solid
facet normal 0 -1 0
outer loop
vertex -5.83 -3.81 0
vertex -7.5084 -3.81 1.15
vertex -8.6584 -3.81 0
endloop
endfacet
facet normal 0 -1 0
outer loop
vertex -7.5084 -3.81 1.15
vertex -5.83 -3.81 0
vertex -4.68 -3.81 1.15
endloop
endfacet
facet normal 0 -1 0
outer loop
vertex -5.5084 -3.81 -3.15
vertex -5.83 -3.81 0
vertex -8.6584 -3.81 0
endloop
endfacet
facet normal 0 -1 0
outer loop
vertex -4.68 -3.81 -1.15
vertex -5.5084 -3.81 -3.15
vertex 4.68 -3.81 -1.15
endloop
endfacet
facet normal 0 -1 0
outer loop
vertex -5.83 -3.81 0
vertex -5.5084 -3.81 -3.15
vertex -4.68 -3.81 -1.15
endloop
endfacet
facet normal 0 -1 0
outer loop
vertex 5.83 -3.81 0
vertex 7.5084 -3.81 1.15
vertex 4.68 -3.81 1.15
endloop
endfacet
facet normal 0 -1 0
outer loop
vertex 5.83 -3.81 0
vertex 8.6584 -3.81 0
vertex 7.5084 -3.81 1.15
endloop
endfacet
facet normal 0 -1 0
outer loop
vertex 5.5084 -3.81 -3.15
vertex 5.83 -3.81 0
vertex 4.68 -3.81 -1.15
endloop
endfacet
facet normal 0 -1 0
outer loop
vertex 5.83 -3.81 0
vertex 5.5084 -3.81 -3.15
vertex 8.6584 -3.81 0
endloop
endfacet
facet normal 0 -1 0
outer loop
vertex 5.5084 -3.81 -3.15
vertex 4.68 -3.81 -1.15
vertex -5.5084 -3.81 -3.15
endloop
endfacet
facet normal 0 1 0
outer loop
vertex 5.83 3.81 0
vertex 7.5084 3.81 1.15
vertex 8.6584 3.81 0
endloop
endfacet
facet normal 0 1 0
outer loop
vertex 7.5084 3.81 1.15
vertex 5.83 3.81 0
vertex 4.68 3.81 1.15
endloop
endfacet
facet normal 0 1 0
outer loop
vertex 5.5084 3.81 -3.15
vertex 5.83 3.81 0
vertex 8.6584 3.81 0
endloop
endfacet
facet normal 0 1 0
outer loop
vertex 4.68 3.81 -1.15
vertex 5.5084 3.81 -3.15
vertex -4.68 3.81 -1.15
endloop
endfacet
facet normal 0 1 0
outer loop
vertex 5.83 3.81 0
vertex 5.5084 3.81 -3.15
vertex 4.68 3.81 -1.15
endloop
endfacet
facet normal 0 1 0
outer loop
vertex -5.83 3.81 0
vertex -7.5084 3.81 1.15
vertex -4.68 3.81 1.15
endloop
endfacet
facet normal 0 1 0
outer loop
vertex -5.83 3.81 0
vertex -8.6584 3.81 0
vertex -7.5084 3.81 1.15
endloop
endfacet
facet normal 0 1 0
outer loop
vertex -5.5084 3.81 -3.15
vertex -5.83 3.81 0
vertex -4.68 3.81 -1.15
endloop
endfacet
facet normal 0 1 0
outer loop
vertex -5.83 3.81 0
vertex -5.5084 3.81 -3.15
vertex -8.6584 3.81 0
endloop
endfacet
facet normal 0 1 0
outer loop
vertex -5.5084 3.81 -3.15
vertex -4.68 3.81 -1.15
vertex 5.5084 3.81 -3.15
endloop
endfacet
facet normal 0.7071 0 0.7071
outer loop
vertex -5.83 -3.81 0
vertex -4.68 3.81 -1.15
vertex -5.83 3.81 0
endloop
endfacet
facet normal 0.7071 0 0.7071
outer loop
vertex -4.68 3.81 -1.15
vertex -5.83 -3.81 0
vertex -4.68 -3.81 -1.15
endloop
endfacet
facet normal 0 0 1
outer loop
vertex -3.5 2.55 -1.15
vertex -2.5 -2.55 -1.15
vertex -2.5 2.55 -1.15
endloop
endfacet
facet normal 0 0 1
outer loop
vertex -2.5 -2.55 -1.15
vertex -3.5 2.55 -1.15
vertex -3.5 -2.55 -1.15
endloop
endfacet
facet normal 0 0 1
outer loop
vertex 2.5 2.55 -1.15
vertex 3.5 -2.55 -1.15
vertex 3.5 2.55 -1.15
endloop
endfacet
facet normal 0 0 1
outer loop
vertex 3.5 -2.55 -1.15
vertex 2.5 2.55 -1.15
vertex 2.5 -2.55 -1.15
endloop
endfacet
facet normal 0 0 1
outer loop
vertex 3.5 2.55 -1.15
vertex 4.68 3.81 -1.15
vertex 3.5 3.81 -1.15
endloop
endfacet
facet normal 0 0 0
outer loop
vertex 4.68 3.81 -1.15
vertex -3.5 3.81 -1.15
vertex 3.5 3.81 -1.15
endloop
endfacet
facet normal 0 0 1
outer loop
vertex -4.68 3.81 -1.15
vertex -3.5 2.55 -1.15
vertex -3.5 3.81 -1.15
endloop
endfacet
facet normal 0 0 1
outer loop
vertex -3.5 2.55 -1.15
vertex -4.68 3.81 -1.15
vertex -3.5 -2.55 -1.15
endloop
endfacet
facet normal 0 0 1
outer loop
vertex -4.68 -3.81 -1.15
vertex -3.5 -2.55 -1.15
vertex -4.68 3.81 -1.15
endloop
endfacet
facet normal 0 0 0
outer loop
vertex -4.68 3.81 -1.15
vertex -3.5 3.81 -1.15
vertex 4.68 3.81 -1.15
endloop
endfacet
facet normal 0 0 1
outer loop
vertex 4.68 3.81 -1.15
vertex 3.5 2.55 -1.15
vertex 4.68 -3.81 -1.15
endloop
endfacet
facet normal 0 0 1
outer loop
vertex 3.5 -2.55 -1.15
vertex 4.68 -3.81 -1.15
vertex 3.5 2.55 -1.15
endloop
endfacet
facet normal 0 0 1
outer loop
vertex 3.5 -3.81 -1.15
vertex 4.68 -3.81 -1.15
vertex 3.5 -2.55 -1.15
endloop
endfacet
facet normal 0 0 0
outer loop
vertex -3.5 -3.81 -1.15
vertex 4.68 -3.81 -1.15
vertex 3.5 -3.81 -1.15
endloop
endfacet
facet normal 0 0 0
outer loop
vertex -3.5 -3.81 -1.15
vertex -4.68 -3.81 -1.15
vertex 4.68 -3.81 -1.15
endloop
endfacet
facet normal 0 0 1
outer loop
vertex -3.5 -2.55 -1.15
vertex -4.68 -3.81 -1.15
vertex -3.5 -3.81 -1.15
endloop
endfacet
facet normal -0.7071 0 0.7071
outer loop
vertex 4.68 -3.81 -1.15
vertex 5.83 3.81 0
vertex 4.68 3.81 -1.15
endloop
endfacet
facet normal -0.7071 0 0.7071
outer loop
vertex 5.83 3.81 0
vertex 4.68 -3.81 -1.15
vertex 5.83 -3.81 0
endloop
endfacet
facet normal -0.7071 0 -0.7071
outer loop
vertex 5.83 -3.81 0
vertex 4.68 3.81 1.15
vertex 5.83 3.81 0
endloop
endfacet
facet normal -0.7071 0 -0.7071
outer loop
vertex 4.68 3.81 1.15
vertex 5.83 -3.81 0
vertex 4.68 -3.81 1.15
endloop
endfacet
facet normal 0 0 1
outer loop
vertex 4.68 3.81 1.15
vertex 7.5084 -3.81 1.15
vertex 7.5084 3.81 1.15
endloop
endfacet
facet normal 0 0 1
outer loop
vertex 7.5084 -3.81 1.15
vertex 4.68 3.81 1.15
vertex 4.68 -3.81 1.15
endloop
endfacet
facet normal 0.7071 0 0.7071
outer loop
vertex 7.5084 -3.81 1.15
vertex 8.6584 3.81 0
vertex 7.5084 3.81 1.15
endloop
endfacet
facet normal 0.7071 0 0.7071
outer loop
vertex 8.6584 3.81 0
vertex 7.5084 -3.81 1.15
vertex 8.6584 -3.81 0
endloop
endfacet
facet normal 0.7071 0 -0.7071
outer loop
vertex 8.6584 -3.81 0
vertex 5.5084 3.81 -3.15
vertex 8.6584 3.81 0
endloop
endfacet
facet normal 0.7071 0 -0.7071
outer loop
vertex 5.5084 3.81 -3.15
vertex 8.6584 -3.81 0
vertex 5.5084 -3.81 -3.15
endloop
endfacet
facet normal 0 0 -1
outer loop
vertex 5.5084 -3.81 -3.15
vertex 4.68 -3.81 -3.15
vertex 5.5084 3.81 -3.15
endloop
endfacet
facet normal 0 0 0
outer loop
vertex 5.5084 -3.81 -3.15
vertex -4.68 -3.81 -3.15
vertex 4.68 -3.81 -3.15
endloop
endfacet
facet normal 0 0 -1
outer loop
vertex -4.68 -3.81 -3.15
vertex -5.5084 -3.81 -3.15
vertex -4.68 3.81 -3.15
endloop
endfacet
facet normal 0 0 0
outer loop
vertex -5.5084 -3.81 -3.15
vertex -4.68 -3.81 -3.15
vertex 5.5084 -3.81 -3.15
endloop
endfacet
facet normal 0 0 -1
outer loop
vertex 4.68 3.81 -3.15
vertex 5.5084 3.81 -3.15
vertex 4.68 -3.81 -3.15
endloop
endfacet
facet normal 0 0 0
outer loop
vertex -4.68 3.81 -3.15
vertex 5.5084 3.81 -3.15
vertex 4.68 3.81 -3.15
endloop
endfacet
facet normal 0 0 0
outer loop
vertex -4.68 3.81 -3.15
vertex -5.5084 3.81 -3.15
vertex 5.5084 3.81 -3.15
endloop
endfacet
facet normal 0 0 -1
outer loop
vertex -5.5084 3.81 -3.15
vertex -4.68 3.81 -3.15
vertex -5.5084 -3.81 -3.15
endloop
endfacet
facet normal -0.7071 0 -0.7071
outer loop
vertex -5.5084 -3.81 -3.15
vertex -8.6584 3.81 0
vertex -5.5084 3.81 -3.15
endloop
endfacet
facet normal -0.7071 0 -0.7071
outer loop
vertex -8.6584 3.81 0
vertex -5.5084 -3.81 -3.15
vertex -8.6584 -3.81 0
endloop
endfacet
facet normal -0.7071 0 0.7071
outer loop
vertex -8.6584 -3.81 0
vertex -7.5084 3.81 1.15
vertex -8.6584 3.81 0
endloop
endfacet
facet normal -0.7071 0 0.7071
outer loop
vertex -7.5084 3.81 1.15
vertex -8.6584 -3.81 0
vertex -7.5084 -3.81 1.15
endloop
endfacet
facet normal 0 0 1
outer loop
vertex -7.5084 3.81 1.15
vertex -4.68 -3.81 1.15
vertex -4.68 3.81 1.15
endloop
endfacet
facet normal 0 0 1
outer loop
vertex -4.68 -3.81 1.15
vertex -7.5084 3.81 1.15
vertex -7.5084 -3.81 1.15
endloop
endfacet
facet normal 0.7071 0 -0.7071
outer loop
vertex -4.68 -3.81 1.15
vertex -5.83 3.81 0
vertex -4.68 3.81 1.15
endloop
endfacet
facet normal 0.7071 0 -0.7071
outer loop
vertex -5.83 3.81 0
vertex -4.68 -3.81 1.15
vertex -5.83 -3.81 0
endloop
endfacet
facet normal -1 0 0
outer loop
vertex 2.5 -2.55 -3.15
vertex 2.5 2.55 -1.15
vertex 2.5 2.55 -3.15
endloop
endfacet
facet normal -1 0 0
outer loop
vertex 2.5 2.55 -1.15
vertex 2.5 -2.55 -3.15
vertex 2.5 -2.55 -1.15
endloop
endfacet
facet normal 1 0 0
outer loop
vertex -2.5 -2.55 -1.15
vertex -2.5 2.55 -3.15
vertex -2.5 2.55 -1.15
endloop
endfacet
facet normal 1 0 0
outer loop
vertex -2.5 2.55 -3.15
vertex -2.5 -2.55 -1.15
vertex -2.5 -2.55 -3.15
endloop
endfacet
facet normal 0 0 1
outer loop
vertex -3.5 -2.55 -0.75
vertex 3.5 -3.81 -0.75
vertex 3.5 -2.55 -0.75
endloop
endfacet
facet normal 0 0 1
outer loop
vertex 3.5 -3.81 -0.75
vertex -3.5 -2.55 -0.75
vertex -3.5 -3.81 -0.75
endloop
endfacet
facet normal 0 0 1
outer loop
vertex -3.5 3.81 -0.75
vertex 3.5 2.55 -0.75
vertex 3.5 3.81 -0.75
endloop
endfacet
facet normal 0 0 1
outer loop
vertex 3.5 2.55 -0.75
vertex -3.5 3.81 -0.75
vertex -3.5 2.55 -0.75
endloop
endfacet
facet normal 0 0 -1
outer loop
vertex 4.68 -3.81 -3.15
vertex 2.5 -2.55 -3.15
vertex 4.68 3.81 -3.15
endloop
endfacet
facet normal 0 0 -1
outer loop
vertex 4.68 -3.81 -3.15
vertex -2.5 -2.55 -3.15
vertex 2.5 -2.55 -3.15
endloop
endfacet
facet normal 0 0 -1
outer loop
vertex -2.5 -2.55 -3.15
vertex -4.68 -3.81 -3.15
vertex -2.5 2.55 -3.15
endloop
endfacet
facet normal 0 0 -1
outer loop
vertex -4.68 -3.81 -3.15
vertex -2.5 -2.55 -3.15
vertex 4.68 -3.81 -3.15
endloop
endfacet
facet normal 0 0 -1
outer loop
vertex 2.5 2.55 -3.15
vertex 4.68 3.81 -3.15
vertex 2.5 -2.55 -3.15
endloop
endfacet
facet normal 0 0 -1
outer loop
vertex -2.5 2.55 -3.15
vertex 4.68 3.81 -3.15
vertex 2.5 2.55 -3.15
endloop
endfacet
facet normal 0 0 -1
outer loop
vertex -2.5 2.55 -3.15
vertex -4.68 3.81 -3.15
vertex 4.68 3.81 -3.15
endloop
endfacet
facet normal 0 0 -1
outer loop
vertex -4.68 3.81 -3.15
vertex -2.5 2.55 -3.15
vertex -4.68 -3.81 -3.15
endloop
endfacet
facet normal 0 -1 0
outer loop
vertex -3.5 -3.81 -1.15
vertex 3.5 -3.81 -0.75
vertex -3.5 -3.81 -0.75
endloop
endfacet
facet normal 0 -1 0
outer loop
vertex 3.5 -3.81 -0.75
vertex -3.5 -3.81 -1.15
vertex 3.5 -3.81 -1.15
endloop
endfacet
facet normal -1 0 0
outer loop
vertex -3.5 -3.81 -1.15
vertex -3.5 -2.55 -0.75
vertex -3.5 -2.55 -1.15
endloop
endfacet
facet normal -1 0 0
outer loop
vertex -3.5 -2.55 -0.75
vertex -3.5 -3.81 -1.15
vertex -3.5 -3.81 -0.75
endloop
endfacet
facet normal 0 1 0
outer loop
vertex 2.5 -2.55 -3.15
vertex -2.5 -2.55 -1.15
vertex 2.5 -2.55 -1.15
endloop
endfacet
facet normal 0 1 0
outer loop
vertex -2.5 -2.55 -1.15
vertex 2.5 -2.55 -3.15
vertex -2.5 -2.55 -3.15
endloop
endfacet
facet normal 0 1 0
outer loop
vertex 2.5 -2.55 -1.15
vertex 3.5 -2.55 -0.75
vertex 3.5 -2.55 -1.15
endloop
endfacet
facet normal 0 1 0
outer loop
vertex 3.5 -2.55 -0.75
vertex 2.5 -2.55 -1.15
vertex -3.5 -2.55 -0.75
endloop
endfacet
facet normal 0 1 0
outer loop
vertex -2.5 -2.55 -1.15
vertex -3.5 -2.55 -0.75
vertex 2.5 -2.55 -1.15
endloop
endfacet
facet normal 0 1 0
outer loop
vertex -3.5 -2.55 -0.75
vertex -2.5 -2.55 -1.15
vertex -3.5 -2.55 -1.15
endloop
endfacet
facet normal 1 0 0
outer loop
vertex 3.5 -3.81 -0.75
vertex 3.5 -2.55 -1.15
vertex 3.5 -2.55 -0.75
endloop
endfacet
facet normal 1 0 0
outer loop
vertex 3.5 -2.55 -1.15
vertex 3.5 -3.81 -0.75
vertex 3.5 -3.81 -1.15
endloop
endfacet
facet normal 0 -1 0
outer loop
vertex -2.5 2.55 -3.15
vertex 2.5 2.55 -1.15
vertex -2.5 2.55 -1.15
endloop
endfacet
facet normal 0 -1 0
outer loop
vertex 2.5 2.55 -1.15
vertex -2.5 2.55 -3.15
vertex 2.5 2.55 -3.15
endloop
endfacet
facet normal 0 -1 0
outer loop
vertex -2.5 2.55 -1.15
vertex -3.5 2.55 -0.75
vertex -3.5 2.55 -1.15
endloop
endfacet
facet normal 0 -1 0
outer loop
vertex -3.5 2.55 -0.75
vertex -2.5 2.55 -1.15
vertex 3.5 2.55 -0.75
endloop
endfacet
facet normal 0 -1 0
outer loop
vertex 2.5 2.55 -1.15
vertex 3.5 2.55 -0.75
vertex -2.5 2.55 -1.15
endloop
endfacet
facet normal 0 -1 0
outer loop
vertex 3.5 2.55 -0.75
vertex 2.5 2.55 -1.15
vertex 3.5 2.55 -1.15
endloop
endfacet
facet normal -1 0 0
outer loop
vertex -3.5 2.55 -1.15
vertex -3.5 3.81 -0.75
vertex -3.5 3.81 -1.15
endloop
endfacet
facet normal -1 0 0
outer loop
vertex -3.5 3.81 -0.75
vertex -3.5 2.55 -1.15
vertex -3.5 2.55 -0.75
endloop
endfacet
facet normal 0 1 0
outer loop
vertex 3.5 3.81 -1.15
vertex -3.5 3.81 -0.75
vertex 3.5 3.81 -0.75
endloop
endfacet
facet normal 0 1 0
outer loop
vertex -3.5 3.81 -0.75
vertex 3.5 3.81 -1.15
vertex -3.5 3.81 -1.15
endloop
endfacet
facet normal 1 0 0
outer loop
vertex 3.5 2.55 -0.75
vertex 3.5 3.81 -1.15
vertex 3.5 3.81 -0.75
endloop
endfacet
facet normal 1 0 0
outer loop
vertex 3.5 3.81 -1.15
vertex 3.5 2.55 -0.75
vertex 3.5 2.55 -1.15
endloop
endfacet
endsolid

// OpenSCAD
$fa = 0.2;
$fs = 0.2;

dim_scale = 2.54;

board_thickness = 1.5;

thickness = 2;
mount_height = 0;
foot_height = 0.4;
lock_height = 0.4;
foot_width_max = 1.5;
foot_length_add = 1;
angle = 45;


sizes = [
    ["sot23", [ 3*dim_scale, 2*dim_scale ], [ 3, 1.7 ]],
    ["sop8", [ 4*dim_scale, 3*dim_scale ], [ 5, 5.1 ]],
    ["sop14", [ 7*dim_scale, 4*dim_scale ], [ 9, 5.1 ]],
];

function clip_add_height() = foot_height + mount_height;

function clip_width(clip_dim) = clip_dim[0] + board_thickness * tan(angle);
function clip_foot_width(clip_dim) = clip_dim[0] - clip_add_height() * tan(angle) * 2;
function clip_lock_width(clip_dim) = clip_dim[0] - lock_height * tan(angle) * 2;

function clip_outer_width(clip_dim) = clip_width(clip_dim) + thickness * 2 / cos(angle);
function clip_outer_foot_width(clip_dim) = clip_foot_width(clip_dim) + thickness * 2 * tan(45 - angle/2);
function clip_outer_lock_width(clip_dim) = clip_lock_width(clip_dim) + thickness * 2 / cos(angle);

module clip_shape(clip_dim) {
    right_part = [
        [clip_foot_width(clip_dim)/2, board_thickness/2 + clip_add_height()],
        [clip_width(clip_dim)/2, 0],
        [clip_lock_width(clip_dim)/2, -board_thickness/2 - lock_height], 
        [clip_outer_lock_width(clip_dim)/2, -board_thickness/2 - lock_height], 
        [clip_outer_width(clip_dim)/2, 0],
        [clip_outer_foot_width(clip_dim)/2, board_thickness/2 + clip_add_height() + thickness],
    ];
    left_part = [ for (i = [len(right_part)-1:-1:0]) [ -right_part[i][0], right_part[i][1] ] ];
    polygon(concat(right_part, left_part));
}

module clip_foot(size, t=thickness) {
    
    clip_dim = size[1];
    chip_dim = size[2];
    
    width = min(clip_dim[1], chip_dim[1]+foot_width_max*2);
    
    color("gray")
    translate([0,0,board_thickness/2]) {
        #linear_extrude(foot_height+mount_height+t)
        difference() {
            square([chip_dim[0] + foot_length_add*2, width],center=true);
            square([chip_dim[0] + foot_length_add*2 + 2, chip_dim[1]],center=true);
        }
        
        translate([0,0,foot_height])
        linear_extrude(mount_height+t)
        difference() {
            square([clip_foot_width(clip_dim), width], center=true);
            square(chip_dim,center=true);
        }
    }
}

module clip(size, with_foot=true, with_preview=true) {

    clip_dim = size[1];
    chip_dim = size[2];

    difference() {
        rotate([90,0,0])
        translate([0,0,-clip_dim[1]/2])
        linear_extrude(clip_dim[1])
        clip_shape(clip_dim);
        
        translate([0,0,thickness/2+board_thickness/2+foot_height+mount_height])
        cube([chip_dim[0], chip_dim[1], thickness+2], center=true);
    }
    
    
    if (with_foot) {
        clip_foot(size);
    }
    
    #if (with_preview && $preview) {
        cube([clip_dim[0], clip_dim[1], board_thickness], center=true);
    }
    
}

function by_preset(preset) = sizes[search([preset], sizes)[0]];


module printable() {
    rotate([180,0,0])
    children();
}

//printable() clip_foot(by_preset("sop8"), 0);

//*rotate([-180,0,0])
//clip_foot(by_preset("sop8"), 0);

//rotate([-180,0,0])
printable() clip(by_preset("sop8"));
//printable() clip(by_preset("sot23"));
